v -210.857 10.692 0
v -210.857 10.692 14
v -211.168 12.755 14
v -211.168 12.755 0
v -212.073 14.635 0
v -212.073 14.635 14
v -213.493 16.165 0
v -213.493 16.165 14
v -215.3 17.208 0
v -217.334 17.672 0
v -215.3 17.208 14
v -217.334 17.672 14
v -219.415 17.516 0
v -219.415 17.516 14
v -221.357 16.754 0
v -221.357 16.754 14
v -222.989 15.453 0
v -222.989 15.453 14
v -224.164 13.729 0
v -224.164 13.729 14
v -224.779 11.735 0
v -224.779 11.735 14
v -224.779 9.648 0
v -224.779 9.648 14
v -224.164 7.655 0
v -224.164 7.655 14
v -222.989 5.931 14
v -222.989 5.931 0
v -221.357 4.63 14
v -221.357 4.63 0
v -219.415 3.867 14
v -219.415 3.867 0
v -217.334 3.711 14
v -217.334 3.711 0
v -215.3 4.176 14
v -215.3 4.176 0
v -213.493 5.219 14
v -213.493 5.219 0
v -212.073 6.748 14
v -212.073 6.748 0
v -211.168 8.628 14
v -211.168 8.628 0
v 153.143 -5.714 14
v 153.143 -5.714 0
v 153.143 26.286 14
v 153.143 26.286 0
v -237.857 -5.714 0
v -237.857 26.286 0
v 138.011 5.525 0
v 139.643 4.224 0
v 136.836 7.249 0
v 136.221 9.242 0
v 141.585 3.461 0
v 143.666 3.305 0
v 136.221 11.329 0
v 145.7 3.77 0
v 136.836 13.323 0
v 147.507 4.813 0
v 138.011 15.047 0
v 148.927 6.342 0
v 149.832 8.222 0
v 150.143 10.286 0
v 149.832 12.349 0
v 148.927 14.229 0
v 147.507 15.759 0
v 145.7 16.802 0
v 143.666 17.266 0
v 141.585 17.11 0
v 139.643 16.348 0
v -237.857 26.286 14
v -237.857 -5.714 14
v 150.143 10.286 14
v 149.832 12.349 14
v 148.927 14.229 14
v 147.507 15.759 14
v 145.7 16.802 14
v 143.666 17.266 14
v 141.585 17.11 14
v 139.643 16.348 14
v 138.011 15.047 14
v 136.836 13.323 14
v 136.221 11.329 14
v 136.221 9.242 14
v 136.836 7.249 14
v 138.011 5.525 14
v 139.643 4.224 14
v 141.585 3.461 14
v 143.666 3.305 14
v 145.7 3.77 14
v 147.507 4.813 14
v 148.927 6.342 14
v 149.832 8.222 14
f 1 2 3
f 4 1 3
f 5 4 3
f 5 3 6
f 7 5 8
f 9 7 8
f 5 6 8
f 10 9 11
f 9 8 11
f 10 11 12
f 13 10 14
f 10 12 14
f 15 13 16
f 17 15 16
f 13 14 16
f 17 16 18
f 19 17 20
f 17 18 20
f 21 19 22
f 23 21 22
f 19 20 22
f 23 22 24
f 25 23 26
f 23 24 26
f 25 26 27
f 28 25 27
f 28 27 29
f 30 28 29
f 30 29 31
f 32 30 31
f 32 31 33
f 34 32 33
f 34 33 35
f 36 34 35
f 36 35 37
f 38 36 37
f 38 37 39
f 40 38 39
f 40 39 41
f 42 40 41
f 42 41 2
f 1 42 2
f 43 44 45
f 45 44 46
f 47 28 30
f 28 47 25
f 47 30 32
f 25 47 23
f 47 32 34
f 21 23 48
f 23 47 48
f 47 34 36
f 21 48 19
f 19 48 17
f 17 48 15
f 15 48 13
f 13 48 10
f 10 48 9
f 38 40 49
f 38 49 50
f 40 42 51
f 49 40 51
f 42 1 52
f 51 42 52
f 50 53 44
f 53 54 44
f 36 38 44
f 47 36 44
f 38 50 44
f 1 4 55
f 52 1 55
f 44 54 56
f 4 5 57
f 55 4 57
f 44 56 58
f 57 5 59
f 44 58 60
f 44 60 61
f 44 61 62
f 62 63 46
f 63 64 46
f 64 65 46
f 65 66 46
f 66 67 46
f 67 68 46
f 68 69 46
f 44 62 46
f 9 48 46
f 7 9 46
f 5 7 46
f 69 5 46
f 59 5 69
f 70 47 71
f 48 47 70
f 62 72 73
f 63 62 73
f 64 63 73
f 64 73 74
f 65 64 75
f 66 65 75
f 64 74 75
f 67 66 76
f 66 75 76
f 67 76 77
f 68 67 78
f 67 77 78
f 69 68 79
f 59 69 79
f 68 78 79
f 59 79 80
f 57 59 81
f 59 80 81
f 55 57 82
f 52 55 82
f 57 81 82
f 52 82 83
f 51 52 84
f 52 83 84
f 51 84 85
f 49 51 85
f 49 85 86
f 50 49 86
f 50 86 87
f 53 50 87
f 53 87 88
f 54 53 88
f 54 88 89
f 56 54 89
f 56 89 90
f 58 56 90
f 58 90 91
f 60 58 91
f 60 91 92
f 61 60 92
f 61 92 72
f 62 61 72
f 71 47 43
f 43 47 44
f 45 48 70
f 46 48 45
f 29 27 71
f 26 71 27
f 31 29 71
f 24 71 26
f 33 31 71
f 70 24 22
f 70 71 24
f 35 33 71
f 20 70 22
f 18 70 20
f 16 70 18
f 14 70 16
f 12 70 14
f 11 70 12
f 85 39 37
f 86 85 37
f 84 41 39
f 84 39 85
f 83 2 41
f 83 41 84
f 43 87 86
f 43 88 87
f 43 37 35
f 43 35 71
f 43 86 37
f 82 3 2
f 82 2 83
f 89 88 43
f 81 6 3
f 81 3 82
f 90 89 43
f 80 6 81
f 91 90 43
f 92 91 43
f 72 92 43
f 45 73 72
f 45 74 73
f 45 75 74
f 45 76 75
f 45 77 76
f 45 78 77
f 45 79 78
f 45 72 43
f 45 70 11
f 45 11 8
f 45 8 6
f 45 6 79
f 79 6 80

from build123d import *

# Parameters (mm, degrees)
SKETCH1_W           = 391
SKETCH1_H           = 32
BOSS_EXTRUDE1_DEPTH = 14
SKETCH2_R           = 7
CUT_EXTRUDE1_DEPTH  = 240.714328282
SKETCH3_R           = 7
CUT_EXTRUDE2_DEPTH  = 240.714328282


with BuildPart() as part:
    # Sketch1 → Boss-Extrude1 (new body)
    with BuildSketch(Plane.XY):
        with Locations((-42.357142857, 10.285714286)):
            Rectangle(SKETCH1_W, SKETCH1_H)
    extrude(amount=BOSS_EXTRUDE1_DEPTH)

    # Sketch2 → Cut-Extrude1 (cut, through all)
    with BuildSketch(Plane.XY.offset(14)):
        with Locations((-217.857142857, 10.691731498)):
            Circle(SKETCH2_R)
    extrude(amount=-CUT_EXTRUDE1_DEPTH, mode=Mode.SUBTRACT)

    # Sketch3 → Cut-Extrude2 (cut, through all)
    with BuildSketch(Plane.XY.offset(14)):
        with Locations((143.142857143, 10.285714286)):
            Circle(SKETCH3_R)
    extrude(amount=-CUT_EXTRUDE2_DEPTH, mode=Mode.SUBTRACT)


solid = part.part
